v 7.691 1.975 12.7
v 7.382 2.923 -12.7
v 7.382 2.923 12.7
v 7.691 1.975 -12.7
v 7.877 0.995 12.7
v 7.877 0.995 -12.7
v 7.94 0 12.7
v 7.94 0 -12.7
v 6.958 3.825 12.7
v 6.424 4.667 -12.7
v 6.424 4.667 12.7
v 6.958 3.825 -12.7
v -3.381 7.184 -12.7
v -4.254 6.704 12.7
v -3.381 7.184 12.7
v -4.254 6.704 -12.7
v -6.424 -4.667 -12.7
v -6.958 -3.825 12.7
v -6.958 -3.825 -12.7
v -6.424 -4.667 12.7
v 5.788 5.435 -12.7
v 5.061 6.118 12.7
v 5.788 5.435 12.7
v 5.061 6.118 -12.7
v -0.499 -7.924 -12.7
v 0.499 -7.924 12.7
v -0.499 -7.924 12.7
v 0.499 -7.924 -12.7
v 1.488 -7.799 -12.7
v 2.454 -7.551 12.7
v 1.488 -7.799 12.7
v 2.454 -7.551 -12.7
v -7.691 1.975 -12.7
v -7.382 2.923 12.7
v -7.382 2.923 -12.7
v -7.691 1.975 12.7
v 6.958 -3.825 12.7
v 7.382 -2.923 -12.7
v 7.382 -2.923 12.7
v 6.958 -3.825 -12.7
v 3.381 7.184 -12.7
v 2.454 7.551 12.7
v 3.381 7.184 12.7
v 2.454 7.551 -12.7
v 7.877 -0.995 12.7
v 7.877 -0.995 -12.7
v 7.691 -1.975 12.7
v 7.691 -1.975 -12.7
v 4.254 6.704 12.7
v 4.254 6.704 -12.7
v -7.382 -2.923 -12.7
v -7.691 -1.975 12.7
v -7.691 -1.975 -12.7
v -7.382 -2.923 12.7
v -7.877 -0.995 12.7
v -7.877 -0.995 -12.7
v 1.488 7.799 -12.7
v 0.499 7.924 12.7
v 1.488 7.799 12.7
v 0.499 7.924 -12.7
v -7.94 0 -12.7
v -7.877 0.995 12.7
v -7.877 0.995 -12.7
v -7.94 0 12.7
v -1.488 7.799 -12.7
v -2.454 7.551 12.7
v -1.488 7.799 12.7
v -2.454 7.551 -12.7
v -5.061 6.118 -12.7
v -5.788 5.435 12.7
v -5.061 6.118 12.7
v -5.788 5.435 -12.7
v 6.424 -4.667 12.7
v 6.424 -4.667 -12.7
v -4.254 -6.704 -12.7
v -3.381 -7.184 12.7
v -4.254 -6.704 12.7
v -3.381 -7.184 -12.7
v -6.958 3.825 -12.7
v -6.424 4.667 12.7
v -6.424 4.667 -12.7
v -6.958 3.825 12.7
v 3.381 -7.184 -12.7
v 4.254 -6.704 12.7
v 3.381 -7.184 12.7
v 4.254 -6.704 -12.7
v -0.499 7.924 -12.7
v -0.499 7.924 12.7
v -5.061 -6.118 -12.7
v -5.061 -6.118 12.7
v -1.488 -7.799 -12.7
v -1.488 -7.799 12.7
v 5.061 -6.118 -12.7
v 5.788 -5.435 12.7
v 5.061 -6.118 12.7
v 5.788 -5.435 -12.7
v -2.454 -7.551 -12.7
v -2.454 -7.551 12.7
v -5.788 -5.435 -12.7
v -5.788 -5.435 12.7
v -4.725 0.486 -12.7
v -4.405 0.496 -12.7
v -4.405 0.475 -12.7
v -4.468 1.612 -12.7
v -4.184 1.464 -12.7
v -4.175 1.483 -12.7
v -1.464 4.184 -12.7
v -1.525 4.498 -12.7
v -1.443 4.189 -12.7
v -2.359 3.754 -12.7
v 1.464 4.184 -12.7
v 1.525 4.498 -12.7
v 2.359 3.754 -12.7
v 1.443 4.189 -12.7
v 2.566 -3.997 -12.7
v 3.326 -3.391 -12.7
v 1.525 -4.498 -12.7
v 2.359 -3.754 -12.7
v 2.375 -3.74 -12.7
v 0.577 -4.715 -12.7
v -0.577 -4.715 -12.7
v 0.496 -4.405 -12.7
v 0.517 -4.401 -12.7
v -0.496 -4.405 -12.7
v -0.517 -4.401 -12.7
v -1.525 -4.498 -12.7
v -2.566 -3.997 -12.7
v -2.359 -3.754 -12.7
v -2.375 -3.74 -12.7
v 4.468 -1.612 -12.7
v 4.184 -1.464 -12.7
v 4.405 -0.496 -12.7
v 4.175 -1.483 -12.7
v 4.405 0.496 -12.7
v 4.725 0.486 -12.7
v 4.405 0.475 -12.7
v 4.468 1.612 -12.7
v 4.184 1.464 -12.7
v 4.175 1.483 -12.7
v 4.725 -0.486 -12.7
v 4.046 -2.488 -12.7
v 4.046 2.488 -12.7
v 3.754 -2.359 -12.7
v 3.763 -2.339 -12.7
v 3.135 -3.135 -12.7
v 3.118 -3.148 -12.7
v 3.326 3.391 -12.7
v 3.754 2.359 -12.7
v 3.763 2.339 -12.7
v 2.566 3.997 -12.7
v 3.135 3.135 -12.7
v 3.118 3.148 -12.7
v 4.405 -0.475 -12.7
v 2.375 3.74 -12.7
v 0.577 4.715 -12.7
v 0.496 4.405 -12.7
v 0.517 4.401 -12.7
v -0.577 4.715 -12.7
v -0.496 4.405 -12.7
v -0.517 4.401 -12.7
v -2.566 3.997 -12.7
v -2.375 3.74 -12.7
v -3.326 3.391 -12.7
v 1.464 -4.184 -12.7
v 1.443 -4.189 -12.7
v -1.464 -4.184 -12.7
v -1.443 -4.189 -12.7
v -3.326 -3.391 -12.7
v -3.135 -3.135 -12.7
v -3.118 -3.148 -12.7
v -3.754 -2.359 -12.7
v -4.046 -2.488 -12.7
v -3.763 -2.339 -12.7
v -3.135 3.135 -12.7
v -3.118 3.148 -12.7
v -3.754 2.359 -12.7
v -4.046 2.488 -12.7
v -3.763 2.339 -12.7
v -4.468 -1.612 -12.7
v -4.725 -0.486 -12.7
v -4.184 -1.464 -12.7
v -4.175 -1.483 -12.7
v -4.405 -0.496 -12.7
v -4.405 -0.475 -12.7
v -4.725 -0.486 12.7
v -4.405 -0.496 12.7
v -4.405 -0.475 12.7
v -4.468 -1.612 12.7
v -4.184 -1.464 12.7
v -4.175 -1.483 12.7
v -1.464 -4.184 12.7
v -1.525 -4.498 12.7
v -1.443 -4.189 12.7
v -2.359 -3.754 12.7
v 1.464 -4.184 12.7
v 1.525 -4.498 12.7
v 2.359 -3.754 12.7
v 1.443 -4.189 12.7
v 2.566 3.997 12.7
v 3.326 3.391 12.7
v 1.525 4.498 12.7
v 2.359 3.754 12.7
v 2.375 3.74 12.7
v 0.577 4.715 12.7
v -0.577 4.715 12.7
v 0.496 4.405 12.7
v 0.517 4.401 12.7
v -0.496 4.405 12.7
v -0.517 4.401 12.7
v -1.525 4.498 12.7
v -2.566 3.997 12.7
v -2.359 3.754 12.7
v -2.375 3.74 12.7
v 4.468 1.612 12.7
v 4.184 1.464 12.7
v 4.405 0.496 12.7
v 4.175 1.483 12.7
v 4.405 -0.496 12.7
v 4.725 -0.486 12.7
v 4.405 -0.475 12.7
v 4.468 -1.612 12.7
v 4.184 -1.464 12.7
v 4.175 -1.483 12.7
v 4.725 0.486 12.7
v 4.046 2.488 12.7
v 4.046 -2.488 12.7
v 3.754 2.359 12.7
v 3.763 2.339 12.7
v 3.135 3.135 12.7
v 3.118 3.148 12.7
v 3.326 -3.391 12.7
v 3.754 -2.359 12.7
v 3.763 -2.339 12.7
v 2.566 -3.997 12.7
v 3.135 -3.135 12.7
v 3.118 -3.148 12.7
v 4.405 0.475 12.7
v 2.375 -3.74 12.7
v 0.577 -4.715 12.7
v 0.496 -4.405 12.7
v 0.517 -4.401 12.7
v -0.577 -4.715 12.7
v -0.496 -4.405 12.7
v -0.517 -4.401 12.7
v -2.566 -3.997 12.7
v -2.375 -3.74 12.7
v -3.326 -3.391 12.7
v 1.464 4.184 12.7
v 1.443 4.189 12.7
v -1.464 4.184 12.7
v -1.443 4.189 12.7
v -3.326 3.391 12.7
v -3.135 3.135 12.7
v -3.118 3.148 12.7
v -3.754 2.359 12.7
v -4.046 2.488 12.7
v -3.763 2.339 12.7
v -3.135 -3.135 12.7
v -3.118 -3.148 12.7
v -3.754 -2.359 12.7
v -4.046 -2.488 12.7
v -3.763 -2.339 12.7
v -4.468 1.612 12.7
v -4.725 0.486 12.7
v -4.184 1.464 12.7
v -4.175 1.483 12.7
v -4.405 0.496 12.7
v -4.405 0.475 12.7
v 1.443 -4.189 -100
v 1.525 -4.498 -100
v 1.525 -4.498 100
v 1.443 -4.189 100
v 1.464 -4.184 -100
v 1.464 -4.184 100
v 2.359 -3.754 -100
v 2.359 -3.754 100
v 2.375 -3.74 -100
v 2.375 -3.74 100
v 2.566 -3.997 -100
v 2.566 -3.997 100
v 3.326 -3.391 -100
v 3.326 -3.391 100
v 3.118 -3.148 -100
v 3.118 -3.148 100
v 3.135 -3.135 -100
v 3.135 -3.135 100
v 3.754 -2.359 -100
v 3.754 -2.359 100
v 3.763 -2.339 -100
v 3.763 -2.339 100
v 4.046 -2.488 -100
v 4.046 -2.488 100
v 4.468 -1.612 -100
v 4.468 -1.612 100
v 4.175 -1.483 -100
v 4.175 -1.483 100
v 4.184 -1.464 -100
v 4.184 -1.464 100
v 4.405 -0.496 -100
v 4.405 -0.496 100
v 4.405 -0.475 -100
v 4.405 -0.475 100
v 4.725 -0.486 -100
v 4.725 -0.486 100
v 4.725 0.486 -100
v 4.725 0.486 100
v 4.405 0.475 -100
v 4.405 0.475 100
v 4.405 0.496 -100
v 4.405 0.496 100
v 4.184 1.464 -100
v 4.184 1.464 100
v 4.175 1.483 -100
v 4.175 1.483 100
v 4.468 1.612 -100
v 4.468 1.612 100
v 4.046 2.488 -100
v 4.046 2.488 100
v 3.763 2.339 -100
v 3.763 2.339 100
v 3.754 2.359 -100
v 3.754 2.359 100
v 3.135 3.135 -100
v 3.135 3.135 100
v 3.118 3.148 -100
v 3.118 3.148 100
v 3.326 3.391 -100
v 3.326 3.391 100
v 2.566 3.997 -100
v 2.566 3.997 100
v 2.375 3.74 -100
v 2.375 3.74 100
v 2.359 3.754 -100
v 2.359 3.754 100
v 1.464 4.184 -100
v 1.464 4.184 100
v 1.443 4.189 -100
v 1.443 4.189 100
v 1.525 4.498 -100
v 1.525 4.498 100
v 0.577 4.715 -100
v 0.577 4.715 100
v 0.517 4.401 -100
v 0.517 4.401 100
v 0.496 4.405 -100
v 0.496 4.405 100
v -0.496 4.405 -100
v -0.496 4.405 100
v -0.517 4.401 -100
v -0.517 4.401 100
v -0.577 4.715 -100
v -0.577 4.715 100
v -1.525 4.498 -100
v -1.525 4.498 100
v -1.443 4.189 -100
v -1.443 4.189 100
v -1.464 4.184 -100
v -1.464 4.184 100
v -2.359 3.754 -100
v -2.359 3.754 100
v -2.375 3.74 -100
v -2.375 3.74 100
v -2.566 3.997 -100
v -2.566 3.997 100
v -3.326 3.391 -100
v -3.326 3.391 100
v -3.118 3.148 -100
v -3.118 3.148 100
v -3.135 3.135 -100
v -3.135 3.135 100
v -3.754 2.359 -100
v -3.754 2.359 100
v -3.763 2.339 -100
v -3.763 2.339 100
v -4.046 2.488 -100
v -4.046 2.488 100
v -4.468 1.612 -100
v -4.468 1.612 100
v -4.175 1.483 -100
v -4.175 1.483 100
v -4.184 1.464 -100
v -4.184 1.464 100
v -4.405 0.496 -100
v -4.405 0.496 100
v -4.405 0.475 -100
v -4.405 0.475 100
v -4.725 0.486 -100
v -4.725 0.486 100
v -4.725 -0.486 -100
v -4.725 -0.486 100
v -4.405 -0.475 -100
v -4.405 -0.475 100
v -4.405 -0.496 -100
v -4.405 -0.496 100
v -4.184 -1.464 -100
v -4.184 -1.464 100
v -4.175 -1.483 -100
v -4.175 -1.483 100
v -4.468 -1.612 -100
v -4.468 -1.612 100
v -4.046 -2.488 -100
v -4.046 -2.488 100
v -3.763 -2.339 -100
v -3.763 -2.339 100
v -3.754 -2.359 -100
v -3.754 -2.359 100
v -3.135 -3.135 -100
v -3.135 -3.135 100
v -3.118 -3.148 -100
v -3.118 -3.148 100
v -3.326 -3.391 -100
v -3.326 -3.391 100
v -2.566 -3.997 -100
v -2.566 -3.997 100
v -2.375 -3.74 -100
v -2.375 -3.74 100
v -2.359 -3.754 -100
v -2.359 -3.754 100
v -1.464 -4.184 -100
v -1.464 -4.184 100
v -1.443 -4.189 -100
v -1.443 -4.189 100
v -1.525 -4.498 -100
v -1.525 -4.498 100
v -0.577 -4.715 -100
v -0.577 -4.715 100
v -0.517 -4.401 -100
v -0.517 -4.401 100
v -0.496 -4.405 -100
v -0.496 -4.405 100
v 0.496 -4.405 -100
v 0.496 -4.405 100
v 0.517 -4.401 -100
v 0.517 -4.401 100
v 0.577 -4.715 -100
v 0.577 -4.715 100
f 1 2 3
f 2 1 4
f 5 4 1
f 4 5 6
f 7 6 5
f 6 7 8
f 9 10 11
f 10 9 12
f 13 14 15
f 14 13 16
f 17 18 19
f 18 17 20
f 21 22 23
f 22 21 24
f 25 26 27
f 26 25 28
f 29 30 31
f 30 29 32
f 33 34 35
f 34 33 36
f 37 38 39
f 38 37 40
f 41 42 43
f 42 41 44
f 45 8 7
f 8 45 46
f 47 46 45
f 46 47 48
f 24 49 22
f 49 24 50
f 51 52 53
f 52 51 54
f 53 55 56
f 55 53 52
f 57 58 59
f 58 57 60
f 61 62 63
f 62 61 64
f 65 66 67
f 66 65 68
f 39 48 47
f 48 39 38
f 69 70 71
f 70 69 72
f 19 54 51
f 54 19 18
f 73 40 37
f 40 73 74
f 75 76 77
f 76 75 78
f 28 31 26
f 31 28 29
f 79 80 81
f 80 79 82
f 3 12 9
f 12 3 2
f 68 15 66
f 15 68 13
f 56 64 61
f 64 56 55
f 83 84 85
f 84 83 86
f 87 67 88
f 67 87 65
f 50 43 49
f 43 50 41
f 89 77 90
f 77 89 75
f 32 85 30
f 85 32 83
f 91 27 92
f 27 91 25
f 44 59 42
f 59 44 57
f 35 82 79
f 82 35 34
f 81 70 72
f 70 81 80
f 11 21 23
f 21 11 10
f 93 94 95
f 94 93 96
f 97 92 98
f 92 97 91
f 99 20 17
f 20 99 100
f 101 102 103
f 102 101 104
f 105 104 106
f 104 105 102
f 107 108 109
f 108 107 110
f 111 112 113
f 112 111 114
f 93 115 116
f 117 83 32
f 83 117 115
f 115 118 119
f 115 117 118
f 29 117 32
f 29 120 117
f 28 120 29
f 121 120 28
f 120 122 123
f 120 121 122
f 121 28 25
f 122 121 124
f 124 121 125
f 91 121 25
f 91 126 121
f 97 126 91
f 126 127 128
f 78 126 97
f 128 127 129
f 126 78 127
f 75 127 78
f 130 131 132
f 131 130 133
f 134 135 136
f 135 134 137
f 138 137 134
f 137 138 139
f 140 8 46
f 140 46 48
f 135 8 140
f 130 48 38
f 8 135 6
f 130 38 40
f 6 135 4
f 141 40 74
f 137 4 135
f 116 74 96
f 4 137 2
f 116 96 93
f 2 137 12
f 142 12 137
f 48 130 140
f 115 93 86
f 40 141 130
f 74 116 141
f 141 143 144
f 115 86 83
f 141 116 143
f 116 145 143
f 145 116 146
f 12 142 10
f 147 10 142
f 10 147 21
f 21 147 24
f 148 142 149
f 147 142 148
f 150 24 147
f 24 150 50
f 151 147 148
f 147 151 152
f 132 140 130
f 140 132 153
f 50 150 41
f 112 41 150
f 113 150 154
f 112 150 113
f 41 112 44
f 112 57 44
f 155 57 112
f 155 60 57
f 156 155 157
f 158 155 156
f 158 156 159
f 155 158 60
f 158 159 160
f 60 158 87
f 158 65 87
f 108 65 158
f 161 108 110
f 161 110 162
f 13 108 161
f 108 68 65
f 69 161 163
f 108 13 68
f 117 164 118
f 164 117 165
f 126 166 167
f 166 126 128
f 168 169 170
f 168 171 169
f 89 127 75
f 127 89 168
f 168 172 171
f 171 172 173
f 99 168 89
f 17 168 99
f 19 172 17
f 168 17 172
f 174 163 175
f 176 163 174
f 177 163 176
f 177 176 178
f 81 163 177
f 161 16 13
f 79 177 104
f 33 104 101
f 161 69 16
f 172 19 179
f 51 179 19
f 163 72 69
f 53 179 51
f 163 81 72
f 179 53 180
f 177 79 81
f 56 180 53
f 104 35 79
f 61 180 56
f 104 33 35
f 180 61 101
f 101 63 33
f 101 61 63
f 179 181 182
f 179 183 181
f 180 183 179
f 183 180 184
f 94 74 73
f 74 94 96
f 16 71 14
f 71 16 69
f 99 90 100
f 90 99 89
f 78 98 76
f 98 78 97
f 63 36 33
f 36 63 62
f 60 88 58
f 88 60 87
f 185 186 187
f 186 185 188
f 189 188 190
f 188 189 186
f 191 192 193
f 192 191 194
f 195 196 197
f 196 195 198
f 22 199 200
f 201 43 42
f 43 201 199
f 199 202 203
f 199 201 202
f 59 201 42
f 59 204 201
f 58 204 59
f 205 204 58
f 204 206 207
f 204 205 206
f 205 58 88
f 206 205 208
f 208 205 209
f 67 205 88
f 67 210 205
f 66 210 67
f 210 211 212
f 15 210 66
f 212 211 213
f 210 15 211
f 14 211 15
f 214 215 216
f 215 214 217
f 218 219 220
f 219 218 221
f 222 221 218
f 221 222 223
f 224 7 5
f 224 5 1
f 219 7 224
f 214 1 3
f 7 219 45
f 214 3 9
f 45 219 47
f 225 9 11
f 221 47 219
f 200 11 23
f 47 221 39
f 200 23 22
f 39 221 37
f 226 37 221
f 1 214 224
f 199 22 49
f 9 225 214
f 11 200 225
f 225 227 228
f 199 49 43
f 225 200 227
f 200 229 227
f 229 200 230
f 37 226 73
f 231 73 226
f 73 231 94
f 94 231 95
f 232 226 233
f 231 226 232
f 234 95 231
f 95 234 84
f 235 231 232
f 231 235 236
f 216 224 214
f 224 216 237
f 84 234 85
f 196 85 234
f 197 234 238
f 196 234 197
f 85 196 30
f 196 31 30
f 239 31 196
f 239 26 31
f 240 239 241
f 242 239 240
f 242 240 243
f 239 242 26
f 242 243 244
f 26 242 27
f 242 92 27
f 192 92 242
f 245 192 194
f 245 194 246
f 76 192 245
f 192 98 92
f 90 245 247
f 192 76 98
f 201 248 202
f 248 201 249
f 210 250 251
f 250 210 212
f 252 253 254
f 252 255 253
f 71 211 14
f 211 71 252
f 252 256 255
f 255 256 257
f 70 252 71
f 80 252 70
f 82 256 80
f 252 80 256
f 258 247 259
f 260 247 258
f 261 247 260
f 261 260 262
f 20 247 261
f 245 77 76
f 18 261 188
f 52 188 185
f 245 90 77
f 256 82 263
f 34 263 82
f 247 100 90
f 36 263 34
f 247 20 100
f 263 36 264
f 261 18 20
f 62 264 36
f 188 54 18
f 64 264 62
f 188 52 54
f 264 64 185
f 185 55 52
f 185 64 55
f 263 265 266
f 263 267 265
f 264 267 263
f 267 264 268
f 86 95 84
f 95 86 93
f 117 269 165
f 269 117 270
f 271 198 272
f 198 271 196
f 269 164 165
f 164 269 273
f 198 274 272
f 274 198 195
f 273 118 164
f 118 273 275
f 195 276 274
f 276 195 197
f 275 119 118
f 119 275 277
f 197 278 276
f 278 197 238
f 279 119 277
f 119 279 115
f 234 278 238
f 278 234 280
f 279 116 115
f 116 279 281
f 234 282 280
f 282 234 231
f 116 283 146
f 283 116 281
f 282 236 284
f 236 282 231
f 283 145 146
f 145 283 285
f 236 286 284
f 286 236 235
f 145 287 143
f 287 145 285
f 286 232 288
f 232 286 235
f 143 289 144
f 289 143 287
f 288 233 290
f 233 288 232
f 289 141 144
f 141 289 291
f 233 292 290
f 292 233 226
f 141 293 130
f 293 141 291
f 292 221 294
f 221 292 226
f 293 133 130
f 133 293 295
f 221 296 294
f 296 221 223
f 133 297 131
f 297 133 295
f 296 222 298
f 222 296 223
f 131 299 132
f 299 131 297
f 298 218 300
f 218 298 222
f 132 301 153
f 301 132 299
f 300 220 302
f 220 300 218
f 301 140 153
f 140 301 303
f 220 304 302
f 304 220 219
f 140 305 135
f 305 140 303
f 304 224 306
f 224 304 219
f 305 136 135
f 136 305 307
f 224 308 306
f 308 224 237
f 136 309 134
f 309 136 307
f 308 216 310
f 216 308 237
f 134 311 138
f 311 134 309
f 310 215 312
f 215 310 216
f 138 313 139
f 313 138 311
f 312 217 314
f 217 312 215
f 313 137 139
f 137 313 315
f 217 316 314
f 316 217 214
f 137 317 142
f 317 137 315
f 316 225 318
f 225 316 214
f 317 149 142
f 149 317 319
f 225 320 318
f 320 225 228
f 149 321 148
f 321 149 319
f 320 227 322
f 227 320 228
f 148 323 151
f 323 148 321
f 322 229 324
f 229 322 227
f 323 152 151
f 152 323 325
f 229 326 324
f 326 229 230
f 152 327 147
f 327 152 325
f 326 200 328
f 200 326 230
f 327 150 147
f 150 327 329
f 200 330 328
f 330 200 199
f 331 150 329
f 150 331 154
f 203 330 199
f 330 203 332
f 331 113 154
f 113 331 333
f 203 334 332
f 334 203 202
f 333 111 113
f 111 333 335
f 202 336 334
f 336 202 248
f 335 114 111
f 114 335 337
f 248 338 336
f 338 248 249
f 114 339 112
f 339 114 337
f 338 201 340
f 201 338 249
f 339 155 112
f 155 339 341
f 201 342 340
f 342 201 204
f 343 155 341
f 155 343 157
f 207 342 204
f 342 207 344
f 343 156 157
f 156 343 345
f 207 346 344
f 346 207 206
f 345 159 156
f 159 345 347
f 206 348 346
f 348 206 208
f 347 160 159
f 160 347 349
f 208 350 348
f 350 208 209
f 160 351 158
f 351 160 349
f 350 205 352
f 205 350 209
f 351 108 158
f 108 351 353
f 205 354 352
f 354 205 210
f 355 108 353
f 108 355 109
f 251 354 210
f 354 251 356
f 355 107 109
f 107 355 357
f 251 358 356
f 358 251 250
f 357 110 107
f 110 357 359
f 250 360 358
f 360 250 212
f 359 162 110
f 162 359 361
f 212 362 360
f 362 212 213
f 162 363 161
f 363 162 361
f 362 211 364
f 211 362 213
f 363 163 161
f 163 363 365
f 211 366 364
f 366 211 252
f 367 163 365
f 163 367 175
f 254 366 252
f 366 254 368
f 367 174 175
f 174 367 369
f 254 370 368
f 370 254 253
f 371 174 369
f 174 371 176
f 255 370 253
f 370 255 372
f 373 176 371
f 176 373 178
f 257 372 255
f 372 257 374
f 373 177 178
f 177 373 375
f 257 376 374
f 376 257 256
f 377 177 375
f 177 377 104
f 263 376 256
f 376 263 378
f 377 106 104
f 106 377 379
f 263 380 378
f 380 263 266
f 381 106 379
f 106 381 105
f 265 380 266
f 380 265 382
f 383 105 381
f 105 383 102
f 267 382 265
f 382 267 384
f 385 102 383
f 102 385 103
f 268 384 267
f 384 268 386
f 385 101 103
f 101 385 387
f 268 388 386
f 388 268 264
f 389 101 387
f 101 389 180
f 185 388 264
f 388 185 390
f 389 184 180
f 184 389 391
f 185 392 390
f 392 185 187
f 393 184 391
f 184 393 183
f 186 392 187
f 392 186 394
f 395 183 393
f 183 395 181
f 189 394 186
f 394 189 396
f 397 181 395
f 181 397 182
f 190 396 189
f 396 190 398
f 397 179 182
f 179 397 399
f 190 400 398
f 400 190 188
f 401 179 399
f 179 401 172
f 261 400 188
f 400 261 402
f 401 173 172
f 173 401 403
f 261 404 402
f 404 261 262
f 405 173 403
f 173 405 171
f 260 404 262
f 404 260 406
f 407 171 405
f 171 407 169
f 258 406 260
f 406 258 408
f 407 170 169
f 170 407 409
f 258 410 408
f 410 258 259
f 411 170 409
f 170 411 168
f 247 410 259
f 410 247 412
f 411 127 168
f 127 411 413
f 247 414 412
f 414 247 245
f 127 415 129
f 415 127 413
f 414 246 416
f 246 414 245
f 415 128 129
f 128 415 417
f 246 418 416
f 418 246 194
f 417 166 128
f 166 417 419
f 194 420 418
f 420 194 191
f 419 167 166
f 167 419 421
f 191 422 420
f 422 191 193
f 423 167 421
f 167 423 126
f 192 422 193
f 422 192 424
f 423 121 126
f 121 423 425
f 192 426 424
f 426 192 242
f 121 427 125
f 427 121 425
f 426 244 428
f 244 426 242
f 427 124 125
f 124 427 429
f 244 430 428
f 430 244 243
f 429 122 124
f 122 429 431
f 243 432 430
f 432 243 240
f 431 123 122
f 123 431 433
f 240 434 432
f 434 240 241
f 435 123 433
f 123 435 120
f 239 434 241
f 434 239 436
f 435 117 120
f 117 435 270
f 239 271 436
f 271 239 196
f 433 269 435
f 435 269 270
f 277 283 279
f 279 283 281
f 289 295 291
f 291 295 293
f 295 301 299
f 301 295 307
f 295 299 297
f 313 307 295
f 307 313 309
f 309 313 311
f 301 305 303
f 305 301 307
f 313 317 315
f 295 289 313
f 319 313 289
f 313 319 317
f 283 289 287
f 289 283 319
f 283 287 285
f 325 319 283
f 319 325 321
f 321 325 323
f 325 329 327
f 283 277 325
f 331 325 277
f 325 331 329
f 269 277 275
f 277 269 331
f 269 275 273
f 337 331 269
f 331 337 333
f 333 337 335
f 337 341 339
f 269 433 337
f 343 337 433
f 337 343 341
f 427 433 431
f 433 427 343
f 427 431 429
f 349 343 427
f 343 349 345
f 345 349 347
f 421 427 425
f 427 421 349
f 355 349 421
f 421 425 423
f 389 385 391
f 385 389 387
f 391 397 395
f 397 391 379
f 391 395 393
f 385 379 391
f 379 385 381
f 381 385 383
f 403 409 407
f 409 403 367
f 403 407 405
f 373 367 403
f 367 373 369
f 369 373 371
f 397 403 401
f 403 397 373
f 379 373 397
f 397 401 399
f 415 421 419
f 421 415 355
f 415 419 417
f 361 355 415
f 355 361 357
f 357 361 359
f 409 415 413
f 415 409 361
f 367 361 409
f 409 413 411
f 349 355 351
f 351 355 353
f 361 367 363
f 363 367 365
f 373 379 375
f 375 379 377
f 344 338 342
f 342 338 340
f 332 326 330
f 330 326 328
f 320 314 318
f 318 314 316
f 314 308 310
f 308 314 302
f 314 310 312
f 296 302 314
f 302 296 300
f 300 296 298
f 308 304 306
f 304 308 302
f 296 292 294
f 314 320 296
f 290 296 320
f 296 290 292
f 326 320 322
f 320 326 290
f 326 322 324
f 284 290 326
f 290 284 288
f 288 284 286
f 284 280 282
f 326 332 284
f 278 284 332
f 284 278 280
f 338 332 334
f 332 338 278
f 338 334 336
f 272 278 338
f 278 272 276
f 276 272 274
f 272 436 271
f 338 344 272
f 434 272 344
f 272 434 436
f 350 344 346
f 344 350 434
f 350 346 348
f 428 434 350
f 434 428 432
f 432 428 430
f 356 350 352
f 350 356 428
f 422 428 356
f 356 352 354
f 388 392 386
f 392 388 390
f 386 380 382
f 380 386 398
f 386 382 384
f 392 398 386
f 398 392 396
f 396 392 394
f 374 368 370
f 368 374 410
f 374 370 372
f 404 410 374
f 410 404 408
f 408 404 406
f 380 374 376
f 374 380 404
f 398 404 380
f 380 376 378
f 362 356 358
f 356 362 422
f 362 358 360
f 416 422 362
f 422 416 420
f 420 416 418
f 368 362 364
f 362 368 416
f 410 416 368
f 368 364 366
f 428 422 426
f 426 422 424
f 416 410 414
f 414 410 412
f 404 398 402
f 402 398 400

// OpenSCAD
/*
 * Model of a SRSS BP linear spline bearing for spline shaft
 * http://www.reliance.co.uk/shop/products.php?10282&cPath=656_657_658
 * 
 * This object is for display only. it is not printable
 * 
 * 
 */
use <MCAD/gears.scad>

$fn=50;

SRSSBP_6 = [6.35, 12.70, 19.1];
SRSSBP_10 = [9.53, 15.88, 25.4]; 

function SRSSBP10_length() = SRSSBP_10[2];
function SRSSBP10_dia() = SRSSBP_10[1];

module SRSSBP(size)
{
	if (size == 6)
	{
		color("DimGray", 1) _SRSSBP(SRSSBP_6[0], SRSSBP_6[1], SRSSBP_6[2]);
	}
	if (size == 10)
	{
		color("DimGray", 1) _SRSSBP(SRSSBP_10[0], SRSSBP_10[1], SRSSBP_10[2]);
	}
}

module _SRSSBP(shaft_dia, bushing_outside_dia, bushing_length)
{
	difference()
	{
		//the bearing
		cylinder(d=bushing_outside_dia, h=bushing_length, center=true);
		_SRSSBP_rod(shaft_dia, bushing_length+1);
	}
}

module SRSSBP_rod(size, length)
{
	if (size == 6)
	{
		color("DimGray", 1) _SRSSBP_rod(SRSSBP_6[0], length);
	}
	if (size == 10)
	{
		color("DimGray", 1) _SRSSBP_rod(SRSSBP_10[0], length);
	}
}

module _SRSSBP_rod(dia, length)
{
	//      Circular pitch: Length of the arc from one tooth to the next
	translate([0,0,-length/2])
		linear_extrude(length) gear(number_of_teeth=14,circular_pitch=((3.14*dia)/14)*50,pressure_angle=0,clearance = -dia/11);
	
	 //#translate([0,-dia/2,0]) cylinder(d=dia, h=length, centre=0); //my little alignment cylinder
}


//uncomment to display
SRSSBP(10);
SRSSBP_rod(10, 200);
//SRSSBP_rod(6, 200);
